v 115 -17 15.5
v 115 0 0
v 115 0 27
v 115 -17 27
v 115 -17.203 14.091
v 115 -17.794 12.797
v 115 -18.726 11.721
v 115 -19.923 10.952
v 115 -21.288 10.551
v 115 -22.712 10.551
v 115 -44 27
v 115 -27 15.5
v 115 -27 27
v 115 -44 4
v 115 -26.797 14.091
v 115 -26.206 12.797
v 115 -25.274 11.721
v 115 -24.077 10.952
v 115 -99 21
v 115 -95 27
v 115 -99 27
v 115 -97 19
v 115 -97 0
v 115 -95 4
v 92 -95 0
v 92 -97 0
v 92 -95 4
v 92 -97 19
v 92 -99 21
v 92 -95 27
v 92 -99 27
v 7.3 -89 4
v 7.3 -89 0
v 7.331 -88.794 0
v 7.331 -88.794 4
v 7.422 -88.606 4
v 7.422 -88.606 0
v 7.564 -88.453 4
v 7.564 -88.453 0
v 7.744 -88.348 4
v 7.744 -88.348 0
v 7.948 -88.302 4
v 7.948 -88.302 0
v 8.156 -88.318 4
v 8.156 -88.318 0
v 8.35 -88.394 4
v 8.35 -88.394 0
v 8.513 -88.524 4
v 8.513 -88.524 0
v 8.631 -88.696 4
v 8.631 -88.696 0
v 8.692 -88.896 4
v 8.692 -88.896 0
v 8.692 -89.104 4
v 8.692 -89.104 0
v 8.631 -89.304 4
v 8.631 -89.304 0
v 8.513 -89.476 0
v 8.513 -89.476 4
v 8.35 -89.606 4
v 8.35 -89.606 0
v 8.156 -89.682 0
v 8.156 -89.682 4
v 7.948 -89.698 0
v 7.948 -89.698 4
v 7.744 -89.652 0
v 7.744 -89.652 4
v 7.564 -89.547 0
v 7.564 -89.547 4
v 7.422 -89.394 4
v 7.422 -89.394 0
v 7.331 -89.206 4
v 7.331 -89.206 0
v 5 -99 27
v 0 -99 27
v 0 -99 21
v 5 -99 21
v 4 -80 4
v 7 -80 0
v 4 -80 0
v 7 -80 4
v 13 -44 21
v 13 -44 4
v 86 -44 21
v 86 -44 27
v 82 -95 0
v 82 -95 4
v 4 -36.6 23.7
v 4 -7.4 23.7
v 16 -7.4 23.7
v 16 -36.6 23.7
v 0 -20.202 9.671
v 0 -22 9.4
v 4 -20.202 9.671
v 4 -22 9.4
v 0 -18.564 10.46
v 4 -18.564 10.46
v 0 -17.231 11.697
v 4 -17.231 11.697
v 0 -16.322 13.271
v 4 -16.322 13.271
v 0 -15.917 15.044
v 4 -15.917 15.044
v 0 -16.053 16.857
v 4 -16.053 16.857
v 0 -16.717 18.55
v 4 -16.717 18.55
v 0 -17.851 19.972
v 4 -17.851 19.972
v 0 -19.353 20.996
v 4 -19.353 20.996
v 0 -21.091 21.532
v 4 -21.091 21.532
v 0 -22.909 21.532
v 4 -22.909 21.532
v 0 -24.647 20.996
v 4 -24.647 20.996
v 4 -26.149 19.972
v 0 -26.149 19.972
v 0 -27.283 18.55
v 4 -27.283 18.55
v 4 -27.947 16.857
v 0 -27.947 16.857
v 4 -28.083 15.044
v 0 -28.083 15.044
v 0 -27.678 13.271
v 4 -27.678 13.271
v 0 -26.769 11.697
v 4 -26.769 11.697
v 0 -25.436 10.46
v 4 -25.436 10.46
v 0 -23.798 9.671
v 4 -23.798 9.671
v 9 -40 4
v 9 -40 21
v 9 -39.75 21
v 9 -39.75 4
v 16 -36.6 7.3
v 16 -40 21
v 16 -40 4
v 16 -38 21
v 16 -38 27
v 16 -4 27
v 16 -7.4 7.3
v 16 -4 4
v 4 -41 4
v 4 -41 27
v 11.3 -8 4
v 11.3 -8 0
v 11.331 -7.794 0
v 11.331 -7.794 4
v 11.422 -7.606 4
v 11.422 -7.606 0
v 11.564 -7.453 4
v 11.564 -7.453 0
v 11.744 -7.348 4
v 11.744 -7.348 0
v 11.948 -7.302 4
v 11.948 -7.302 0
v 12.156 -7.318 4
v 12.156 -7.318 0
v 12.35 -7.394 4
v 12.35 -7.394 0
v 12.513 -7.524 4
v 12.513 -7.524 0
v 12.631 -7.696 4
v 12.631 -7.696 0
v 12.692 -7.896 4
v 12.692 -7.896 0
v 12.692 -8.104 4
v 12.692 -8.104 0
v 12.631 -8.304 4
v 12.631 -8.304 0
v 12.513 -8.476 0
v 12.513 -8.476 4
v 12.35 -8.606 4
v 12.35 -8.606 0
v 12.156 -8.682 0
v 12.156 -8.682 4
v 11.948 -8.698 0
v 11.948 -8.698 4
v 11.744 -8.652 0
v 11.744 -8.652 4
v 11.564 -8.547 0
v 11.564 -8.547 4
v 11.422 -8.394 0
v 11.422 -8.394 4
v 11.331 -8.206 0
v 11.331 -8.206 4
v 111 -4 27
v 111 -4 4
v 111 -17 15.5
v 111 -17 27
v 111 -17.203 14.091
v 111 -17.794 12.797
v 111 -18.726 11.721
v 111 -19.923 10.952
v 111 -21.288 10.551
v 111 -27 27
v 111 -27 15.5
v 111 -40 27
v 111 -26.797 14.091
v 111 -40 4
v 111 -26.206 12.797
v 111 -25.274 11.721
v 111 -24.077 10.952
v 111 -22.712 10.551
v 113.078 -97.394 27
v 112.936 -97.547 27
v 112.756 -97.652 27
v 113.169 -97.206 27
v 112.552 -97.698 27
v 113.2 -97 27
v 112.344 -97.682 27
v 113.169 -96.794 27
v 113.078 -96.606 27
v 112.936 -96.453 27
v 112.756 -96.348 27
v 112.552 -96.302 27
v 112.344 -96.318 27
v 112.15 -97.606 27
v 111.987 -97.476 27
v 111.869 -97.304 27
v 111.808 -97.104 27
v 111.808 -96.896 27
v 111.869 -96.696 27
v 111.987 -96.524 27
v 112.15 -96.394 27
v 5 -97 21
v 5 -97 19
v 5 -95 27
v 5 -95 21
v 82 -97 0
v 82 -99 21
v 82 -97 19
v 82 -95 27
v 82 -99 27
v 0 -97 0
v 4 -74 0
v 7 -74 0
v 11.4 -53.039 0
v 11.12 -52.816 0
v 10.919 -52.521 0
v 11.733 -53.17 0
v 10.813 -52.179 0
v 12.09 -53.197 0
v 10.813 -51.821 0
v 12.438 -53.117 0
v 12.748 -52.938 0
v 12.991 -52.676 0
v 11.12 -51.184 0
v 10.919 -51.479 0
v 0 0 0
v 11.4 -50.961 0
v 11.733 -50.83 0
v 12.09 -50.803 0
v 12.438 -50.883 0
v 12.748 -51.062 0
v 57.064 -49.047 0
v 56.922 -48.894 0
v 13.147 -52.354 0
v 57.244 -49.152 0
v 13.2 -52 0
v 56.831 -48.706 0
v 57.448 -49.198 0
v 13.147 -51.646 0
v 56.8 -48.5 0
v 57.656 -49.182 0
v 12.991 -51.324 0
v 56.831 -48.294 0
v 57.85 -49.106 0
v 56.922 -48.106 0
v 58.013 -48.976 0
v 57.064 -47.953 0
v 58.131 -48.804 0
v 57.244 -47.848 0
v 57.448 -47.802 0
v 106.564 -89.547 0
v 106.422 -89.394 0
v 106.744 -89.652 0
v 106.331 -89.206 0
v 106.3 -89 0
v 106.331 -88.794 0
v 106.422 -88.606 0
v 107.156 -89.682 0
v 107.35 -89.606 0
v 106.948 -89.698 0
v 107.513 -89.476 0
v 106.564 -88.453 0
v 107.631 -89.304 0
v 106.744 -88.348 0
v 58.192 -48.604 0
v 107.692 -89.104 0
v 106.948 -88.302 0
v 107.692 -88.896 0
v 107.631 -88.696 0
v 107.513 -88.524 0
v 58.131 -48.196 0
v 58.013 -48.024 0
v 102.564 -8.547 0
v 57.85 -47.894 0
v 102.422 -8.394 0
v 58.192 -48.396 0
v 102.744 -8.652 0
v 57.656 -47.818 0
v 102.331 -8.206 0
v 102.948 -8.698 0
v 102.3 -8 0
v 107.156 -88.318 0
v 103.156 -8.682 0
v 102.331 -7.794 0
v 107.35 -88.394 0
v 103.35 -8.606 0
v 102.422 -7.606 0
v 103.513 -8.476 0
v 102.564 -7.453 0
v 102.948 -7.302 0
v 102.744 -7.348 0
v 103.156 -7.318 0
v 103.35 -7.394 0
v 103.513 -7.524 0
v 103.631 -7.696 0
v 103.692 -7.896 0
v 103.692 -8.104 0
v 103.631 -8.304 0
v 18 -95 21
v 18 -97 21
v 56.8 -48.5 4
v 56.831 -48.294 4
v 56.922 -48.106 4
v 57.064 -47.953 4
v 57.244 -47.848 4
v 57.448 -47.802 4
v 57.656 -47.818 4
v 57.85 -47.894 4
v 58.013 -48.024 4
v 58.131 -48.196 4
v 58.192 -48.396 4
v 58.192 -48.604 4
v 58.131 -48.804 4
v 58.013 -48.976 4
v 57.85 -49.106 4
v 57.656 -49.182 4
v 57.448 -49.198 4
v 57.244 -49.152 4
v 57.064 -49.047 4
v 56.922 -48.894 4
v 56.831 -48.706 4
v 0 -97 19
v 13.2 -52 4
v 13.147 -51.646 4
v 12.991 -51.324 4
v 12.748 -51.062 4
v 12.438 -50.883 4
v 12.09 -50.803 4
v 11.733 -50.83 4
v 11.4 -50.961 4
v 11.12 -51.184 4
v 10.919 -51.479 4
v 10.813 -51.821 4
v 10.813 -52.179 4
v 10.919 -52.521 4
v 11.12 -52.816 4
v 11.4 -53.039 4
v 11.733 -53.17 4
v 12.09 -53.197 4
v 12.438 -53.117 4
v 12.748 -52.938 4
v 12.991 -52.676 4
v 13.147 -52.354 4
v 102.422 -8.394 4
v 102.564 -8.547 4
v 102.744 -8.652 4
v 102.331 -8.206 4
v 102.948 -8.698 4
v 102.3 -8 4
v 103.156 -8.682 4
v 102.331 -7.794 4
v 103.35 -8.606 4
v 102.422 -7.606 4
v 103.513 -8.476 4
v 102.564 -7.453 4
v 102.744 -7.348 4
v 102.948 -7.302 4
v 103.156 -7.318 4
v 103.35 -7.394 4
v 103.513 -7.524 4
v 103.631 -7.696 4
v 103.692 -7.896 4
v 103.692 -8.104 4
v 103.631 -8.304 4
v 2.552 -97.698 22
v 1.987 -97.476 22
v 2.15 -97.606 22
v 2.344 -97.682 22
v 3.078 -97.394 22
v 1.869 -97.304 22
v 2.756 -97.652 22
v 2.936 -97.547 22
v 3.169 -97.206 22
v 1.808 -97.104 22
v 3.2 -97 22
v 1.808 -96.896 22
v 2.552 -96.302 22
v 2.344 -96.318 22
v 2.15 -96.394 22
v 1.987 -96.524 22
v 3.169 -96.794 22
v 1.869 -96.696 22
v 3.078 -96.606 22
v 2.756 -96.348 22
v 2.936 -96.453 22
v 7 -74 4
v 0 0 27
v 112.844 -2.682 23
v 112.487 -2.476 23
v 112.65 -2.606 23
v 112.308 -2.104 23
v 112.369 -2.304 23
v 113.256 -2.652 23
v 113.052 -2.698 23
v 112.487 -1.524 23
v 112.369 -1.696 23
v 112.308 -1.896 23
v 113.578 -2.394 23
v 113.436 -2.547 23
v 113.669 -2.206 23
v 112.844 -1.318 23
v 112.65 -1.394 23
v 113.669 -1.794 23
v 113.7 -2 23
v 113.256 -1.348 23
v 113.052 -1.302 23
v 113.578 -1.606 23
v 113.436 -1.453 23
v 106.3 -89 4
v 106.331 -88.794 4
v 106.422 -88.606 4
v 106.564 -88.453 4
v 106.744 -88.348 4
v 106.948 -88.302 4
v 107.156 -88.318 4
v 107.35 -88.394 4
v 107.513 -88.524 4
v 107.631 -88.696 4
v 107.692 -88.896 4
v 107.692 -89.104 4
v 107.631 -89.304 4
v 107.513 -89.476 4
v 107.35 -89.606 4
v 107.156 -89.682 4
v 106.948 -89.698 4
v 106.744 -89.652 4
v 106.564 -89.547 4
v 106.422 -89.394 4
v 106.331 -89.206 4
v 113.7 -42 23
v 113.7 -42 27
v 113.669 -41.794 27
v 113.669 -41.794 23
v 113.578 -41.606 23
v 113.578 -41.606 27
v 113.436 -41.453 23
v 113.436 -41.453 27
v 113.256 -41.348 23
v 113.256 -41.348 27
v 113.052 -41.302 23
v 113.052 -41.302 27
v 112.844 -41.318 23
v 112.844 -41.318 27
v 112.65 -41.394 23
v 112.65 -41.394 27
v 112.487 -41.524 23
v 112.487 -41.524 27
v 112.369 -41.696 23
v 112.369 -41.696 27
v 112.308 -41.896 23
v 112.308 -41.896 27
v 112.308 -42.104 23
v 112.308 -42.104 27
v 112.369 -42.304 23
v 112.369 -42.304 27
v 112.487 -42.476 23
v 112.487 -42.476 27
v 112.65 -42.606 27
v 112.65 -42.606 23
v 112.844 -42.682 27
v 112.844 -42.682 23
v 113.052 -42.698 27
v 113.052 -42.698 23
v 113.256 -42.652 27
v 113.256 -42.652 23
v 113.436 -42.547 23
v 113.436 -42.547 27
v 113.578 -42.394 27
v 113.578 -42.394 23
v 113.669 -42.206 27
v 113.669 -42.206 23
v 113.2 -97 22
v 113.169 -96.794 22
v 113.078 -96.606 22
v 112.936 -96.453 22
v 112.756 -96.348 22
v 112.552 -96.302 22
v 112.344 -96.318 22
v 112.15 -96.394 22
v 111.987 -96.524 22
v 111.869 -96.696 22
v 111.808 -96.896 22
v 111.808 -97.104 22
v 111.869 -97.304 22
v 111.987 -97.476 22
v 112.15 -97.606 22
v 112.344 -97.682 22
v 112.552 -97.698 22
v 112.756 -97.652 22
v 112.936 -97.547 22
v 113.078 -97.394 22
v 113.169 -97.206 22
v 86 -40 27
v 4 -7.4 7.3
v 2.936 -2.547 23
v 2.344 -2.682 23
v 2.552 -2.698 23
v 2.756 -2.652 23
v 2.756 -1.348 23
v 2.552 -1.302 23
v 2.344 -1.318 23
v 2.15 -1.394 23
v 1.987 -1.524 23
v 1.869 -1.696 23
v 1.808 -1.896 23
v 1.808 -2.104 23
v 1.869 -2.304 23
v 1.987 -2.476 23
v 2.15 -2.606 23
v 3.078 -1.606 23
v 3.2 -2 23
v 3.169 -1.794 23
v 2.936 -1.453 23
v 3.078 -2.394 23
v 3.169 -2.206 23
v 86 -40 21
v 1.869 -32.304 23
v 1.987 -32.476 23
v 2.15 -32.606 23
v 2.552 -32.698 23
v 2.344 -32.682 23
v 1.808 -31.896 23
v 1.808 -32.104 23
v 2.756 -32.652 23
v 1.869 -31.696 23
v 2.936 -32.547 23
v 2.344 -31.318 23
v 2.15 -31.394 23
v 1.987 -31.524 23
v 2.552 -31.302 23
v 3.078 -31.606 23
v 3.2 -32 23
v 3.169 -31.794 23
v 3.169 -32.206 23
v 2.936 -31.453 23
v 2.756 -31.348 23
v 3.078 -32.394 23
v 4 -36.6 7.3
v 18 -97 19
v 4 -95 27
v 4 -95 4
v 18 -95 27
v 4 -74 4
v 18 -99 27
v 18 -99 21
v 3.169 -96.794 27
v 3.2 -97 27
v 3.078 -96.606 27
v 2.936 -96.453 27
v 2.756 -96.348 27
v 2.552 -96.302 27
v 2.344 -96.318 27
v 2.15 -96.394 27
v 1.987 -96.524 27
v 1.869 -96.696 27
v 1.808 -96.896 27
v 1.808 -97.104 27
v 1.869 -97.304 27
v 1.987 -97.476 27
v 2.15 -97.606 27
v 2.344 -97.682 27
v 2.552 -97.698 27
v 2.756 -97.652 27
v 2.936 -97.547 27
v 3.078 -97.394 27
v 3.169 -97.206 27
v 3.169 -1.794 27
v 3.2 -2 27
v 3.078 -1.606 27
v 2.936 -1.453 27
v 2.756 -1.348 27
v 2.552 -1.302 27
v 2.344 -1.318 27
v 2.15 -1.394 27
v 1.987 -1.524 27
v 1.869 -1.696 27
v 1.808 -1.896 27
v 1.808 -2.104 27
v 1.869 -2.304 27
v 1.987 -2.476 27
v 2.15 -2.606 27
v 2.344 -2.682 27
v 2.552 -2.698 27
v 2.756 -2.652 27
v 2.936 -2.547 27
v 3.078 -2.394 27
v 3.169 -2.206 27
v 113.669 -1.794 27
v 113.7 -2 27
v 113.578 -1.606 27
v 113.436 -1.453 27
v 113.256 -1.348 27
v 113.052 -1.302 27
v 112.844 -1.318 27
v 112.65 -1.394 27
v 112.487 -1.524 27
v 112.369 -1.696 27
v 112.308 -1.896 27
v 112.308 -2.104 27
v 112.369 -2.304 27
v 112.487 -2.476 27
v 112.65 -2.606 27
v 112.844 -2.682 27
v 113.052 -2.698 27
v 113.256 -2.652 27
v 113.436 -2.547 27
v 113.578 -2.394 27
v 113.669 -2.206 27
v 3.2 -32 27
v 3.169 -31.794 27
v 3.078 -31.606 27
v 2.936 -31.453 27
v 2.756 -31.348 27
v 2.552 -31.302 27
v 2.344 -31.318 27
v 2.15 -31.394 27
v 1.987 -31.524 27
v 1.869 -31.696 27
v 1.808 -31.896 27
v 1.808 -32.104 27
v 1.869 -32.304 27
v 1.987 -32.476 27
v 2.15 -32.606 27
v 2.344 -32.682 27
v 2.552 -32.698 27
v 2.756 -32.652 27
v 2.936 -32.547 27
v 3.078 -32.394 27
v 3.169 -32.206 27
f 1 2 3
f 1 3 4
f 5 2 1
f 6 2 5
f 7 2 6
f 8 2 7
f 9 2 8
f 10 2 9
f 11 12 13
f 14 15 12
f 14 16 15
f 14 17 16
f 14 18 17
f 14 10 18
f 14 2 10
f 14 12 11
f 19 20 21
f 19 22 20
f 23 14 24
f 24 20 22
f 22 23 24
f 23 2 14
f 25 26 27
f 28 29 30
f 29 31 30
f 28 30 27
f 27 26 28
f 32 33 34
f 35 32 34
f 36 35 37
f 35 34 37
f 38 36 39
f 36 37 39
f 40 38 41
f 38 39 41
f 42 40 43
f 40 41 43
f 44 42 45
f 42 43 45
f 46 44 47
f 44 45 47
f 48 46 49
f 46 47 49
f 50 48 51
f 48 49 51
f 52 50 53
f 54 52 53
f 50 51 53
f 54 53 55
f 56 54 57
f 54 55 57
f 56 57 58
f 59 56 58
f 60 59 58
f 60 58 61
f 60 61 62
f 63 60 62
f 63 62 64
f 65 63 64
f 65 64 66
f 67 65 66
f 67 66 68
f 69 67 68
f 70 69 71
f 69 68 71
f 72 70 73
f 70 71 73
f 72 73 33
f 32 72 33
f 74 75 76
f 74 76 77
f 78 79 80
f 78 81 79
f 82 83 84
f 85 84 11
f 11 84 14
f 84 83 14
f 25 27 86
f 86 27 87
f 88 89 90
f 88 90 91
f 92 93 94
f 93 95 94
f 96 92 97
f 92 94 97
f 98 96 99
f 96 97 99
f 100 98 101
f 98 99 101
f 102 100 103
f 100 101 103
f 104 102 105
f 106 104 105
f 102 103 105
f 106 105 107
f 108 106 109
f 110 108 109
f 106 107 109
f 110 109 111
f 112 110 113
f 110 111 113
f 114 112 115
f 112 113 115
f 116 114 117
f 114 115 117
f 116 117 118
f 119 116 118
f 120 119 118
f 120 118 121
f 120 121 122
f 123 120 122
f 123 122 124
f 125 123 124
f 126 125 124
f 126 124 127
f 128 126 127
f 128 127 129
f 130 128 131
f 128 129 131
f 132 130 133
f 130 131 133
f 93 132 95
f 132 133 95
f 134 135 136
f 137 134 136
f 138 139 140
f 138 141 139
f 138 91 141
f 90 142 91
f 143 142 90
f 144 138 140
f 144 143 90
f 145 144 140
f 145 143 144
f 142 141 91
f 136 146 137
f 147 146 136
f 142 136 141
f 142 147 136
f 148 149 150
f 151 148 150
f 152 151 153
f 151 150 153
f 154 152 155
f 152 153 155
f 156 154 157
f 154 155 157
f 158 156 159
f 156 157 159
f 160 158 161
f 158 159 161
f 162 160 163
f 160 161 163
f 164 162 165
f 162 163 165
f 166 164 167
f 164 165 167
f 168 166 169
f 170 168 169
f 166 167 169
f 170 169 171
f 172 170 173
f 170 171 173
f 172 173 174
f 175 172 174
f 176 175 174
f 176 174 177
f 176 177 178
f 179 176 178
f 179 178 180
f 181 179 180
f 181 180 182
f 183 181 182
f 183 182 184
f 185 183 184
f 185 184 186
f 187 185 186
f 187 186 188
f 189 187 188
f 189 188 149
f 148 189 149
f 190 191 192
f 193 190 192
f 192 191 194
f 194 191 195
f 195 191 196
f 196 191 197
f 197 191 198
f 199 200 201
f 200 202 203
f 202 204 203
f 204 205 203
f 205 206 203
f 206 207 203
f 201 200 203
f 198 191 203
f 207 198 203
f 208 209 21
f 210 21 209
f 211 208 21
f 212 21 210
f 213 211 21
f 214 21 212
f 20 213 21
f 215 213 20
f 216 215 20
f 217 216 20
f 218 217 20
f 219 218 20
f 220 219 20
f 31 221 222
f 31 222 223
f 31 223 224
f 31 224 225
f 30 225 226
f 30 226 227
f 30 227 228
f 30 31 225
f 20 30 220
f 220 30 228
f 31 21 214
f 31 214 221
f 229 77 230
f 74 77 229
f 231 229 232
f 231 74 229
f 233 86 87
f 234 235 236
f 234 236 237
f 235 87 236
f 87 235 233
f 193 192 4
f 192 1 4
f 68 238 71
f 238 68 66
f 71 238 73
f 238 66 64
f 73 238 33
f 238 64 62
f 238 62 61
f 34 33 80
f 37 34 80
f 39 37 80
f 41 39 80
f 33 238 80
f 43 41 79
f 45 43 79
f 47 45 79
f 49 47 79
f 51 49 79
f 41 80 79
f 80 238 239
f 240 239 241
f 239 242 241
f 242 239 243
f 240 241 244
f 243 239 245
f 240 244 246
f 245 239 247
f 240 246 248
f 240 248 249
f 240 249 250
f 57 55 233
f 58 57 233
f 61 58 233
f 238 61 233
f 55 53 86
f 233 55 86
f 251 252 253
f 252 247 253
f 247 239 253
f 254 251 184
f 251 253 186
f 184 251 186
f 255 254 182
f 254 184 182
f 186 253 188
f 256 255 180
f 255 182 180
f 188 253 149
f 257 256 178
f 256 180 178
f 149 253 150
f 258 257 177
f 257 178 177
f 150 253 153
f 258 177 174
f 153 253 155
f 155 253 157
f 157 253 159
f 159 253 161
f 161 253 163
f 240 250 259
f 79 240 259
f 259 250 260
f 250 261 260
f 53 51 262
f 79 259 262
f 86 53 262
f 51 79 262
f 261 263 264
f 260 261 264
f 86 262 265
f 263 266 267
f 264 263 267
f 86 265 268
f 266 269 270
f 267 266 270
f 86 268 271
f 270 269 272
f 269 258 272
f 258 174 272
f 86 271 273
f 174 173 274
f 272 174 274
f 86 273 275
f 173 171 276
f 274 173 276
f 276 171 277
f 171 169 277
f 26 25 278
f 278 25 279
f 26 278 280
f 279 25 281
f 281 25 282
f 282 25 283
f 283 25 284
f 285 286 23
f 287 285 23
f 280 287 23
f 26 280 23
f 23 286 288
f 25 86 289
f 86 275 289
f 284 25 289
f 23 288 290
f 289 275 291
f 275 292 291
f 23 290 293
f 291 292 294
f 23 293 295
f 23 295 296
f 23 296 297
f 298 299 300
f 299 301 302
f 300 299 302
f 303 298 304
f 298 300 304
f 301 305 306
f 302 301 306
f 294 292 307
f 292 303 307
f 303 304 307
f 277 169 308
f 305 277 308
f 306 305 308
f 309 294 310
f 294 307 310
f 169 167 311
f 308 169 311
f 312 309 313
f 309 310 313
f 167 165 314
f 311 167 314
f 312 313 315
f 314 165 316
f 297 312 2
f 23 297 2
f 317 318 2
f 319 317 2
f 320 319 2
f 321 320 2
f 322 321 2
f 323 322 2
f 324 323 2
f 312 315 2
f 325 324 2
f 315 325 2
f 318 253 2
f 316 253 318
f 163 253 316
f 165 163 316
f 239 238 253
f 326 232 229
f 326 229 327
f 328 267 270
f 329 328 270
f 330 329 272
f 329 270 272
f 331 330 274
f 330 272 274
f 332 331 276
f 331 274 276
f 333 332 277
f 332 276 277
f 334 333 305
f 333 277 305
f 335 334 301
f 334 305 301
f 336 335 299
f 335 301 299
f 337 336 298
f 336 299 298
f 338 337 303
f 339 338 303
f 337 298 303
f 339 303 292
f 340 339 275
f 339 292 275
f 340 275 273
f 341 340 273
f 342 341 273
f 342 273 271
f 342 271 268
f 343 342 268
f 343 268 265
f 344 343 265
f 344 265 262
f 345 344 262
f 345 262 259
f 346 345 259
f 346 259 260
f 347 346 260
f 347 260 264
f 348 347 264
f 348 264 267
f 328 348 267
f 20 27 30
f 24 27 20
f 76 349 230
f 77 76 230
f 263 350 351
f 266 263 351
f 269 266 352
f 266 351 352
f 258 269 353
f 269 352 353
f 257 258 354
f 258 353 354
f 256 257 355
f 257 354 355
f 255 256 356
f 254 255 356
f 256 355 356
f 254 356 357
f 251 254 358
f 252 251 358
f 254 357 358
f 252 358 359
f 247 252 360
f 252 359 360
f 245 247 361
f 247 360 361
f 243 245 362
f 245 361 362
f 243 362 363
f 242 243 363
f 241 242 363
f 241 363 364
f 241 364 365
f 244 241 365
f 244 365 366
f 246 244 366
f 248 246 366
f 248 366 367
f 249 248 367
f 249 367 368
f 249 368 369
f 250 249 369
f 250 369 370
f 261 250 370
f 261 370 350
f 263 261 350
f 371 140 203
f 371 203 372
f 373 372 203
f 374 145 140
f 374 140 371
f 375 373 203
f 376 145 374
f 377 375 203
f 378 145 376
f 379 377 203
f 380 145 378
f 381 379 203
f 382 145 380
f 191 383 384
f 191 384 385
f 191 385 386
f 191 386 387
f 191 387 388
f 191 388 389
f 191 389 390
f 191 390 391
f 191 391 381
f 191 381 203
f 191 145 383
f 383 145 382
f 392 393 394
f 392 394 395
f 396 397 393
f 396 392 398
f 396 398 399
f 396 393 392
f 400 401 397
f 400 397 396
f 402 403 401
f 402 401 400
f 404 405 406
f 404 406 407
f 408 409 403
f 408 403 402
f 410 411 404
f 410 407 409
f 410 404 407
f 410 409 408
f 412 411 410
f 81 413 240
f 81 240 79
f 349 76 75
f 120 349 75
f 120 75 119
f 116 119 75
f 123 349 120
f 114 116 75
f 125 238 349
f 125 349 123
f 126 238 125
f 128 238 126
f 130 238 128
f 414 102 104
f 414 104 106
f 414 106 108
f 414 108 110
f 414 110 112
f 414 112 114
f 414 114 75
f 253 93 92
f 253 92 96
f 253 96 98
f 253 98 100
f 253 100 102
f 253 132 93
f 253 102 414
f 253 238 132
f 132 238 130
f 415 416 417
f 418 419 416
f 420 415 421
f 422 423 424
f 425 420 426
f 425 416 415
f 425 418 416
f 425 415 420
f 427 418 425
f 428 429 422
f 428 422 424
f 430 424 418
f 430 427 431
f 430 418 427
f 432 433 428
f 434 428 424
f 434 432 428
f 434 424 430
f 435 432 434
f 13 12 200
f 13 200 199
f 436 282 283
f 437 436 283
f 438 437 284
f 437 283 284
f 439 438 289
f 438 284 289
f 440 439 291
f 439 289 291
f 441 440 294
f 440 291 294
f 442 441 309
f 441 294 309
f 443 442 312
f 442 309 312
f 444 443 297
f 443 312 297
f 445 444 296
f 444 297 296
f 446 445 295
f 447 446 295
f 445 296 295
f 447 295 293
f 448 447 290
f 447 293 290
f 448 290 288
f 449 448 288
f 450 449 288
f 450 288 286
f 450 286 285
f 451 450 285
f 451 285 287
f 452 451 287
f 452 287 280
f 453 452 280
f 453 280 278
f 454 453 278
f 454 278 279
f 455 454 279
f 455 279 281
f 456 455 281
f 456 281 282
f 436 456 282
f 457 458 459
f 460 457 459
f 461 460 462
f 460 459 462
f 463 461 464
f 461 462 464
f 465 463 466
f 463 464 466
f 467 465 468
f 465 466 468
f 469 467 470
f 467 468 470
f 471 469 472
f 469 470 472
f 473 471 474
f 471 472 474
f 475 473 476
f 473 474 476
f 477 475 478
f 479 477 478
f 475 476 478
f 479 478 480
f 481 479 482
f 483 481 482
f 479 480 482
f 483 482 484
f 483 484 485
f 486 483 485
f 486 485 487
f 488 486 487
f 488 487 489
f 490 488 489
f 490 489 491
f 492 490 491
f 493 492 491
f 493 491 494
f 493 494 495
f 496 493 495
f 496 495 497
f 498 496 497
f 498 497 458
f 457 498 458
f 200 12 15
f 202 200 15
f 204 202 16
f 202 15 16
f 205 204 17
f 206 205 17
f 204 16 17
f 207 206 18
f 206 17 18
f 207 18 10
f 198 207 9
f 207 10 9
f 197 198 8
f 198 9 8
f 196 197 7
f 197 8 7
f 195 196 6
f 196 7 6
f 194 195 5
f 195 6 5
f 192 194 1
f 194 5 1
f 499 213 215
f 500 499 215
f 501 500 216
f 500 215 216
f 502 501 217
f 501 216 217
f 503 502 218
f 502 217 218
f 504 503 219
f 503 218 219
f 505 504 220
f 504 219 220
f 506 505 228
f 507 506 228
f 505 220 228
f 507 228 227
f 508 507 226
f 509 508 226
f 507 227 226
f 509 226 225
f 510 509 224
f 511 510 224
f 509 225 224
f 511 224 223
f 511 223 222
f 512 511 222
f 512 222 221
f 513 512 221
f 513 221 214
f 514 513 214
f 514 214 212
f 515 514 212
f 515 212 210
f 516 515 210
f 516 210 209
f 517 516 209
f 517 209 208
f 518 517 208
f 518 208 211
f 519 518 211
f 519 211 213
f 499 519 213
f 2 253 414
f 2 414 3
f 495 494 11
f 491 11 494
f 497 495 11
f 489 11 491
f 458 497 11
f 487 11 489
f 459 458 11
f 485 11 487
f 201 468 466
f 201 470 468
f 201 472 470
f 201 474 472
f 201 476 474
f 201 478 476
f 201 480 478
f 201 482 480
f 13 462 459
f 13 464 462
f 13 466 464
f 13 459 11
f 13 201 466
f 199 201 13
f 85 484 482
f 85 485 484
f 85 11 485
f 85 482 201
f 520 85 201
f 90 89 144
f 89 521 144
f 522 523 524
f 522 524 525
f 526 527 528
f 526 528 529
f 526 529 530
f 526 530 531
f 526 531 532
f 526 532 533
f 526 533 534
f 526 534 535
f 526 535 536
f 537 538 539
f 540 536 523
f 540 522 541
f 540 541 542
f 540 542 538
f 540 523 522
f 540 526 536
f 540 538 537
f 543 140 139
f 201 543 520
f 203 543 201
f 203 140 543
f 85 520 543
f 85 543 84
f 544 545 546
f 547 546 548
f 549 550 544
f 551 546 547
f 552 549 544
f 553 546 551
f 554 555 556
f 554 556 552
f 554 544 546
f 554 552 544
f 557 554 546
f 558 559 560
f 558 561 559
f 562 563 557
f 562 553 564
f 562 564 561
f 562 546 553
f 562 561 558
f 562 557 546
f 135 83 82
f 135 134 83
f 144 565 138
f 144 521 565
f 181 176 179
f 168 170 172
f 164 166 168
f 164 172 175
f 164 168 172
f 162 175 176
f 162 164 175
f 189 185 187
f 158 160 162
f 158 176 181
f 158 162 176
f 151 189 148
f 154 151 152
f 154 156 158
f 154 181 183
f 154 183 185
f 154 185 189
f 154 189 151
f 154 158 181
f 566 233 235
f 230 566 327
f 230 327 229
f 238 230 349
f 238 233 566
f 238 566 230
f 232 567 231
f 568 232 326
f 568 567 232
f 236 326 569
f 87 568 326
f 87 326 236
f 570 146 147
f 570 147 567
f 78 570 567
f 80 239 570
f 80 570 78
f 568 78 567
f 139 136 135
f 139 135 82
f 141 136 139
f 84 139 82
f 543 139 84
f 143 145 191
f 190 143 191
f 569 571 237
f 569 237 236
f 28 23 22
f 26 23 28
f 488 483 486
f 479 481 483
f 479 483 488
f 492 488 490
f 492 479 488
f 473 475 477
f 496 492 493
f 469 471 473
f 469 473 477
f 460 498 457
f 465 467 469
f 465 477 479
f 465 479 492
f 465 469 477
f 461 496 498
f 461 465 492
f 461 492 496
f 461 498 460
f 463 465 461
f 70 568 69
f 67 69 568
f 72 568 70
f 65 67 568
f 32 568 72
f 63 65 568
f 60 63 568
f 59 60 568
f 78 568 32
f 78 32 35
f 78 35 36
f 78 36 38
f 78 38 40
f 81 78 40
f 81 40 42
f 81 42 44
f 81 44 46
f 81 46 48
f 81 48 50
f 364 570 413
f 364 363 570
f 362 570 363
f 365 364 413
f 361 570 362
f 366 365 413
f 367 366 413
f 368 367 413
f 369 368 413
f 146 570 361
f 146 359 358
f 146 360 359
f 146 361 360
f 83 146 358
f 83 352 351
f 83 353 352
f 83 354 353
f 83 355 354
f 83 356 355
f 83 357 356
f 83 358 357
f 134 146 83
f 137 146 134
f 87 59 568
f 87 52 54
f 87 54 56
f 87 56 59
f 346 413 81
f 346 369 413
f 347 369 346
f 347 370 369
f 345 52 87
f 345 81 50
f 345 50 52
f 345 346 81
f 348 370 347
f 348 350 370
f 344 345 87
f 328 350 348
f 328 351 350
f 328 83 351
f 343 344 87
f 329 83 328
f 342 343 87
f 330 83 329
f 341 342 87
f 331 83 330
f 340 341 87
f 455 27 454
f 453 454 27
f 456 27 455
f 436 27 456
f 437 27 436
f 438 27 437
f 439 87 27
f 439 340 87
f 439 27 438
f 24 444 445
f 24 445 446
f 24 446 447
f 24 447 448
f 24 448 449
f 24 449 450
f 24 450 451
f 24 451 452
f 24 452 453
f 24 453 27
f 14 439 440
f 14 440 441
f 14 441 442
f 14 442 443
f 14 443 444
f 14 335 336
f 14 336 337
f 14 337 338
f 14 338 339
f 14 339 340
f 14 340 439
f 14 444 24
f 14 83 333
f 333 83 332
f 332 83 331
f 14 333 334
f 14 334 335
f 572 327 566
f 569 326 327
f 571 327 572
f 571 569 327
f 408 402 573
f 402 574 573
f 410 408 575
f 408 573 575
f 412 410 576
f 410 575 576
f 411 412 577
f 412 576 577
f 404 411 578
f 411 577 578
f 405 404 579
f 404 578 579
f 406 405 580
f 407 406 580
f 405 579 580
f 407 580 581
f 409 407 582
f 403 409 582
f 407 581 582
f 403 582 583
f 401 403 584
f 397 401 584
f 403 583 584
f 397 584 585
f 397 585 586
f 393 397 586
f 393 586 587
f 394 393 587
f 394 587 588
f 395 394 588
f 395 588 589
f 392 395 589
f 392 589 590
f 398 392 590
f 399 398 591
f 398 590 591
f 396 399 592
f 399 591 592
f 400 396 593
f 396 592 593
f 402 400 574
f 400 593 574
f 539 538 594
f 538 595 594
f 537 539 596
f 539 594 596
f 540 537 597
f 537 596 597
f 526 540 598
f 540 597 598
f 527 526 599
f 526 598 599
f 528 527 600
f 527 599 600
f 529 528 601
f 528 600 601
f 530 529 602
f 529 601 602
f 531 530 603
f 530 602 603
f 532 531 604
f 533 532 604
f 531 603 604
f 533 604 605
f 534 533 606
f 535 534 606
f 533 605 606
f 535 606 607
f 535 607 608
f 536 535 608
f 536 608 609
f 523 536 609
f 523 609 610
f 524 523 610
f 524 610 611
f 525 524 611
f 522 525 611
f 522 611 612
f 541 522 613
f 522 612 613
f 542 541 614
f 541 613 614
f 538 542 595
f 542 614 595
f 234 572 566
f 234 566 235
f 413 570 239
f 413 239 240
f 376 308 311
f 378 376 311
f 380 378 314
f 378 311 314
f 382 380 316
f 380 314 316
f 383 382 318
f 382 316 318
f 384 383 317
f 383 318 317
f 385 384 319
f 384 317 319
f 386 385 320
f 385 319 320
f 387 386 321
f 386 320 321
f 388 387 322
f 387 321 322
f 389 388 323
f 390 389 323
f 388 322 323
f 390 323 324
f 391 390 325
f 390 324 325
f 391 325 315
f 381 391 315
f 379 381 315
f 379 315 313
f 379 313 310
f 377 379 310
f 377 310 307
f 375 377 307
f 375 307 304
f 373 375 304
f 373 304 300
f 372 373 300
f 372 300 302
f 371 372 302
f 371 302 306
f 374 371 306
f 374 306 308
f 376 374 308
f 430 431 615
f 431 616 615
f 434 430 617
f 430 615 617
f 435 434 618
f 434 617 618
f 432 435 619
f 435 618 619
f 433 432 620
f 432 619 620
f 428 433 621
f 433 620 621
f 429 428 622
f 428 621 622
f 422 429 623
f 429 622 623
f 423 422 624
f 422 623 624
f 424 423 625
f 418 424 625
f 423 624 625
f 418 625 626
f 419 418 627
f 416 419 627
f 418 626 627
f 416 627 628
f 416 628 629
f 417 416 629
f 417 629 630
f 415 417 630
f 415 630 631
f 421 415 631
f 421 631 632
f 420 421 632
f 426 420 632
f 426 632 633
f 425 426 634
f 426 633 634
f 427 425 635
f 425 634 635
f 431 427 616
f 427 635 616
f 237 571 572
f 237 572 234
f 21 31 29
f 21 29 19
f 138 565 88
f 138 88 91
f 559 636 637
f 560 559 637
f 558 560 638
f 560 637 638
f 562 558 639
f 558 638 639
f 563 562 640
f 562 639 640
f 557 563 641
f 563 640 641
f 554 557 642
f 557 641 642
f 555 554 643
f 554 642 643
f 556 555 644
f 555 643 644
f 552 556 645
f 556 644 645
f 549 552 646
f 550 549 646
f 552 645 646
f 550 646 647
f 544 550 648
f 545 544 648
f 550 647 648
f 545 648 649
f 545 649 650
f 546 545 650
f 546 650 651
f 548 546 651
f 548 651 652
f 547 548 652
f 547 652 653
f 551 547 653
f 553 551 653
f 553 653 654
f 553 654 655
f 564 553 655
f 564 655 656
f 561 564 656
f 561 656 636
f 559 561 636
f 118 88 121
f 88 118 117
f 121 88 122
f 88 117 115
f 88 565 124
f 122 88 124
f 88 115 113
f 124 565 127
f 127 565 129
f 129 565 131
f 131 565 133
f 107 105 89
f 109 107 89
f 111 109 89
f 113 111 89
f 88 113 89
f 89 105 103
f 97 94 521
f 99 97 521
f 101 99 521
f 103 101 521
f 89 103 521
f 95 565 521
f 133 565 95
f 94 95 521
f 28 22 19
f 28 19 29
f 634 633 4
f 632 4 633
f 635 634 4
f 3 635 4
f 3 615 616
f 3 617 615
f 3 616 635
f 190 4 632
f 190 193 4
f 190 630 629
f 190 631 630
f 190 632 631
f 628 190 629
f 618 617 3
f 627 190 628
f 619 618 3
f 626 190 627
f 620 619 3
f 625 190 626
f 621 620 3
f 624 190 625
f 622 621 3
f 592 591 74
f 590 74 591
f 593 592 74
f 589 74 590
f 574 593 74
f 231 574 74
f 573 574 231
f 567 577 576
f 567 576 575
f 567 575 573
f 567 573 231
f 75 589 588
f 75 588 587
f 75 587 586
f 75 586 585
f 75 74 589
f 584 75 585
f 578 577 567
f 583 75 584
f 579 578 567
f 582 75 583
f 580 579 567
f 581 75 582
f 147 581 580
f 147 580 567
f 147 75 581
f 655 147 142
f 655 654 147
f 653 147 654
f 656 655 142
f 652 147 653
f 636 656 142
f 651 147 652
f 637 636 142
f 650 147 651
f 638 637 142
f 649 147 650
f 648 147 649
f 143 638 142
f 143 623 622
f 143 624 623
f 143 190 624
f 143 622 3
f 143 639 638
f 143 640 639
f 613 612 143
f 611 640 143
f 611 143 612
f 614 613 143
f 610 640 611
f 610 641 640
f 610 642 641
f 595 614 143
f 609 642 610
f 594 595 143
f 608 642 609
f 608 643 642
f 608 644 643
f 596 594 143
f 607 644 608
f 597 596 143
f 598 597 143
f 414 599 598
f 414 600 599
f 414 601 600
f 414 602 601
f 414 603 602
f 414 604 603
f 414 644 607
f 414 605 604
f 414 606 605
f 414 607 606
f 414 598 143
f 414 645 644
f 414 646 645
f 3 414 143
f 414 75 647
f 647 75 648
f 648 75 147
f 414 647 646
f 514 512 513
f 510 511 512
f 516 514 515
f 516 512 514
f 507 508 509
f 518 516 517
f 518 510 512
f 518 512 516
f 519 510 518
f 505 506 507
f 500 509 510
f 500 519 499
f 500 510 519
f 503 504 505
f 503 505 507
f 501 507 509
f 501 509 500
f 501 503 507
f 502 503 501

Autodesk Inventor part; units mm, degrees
ref_plane "YZ Plane" through (0, 0, 0) normal (1, 0, 0) x (0, 1, 0)
ref_plane "XZ Plane" through (0, 0, 0) normal (0, 1, 0) x (-1, 0, 0)
ref_plane "XY Plane" through (0, 0, 0) normal (0, 0, 1) x (1, 0, 0)
sketch "Skizze1" plane through (0, 0, 0) normal (0, 0, 1) x (1, 0, 0)
  line L0 (0, 0) -> (115, 0)
  line L1 (115, 0) -> (115, -97)
  line L2 (115, -97) -> (0, -97)
  line L3 (0, -97) -> (0, 0)
  dimension "d0" = 115
  dimension "d1" = 97
extrude "Extrusion1" add sketch "Skizze1" along normal blind 4
sketch "Skizze2" plane through (0, 0, 4) normal (0, 0, 1) x (1, 0, 0)
  line L0 (0, -97) -> (115, -97) projected
  line L1 (115, -97) -> (115, 0) projected
  line L2 (115, 0) -> (0, 0) projected
  line L3 (0, 0) -> (0, -97) projected
  line L4 (4, -44) -> (4, -95)
  line L5 (4, -95) -> (115, -95)
  line L6 (115, -97) -> (115, 0) projected
  line L7 (4, -44) -> (115, -44)
  line L8 (4, -40) -> (16, -40) construction
  line L9 (4, -40) -> (4, -36.6) construction
  line L10 (4, -4) -> (16, -4) construction
  line L11 (4, -7.4) -> (16, -7.4)
  line L12 (16, -7.4) -> (16, -4)
  line L13 (4, -36.6) -> (16, -36.6)
  line L14 (16, -36.6) -> (16, -40)
  line L15 (4, -36.6) -> (4, -7.4)
  line L16 (16, -40) -> (111, -40)
  line L17 (4, -7.4) -> (4, -4) construction
  line L18 (16, -4) -> (111, -4)
  line L19 (111, -4) -> (111, -40)
  point P0 (109.25, 0)
  point P1 (109.25, -40)
  dimension "d4" = 4
  dimension "d5" = 2
  dimension "d6" = 51
  dimension "d7" = 4
  dimension "d8" = 36
  dimension "d9" = 4
  dimension "d10" = 29.2
  dimension "d11" = 12
  dimension "d30" = 4
extrude "Extrusion2" add sketch "Skizze2" along normal blind 23 contours L3 L2 L1 L7 L4 L5 L0
sketch "Skizze4" plane through (0, 0, 4) normal (0, 0, 1) x (1, 0, 0)
  line L0 (4, -36.6) -> (16, -36.6) projected
  line L1 (4, -36.6) -> (16, -36.6)
  line L2 (16, -36.6) -> (16, -7.4)
  line L3 (16, -7.4) -> (4, -7.4)
  line L4 (4, -7.4) -> (4, -36.6)
  point P0 (0, 0)
  point P1 (16, -7.4)
extrude "Extrusion4" add sketch "Skizze4" along normal blind 3.3
sketch "Skizze5" plane through (4, -36.6, 27) normal (1, 0, 0) x (0, 0, -1)
  line L0 (0, 0) -> (0, 29.2) projected
  line L1 (0, 29.2) -> (3.3, 29.2)
  line L2 (3.3, 29.2) -> (3.3, 0)
  line L3 (3.3, 0) -> (0, 0)
  line L4 (0, 0) -> (0, 29.2)
  line L5 (19.7, 0) -> (0, 0) projected
  line L6 (19.7, 0) -> (19.7, 29.2) projected
  circle A0 centre (11.5, 14.6) radius 6.1
  line L7 (7.2229, 14.6) -> (16.7001, 14.6)
  line L8 (11.5, 24.1317) -> (11.5, 8.2548) construction
  point P0 (27, 36.6)
  dimension "d20" = 16.4
  dimension "d21" = 29.2
  dimension "d22" = 12.2
extrude "Extrusion5" cut sketch "Skizze5" against normal through all contours A0
extrude "Extrusion6" add sketch "Skizze5" along normal up to surface (12 mm away) contours L0 L1 L2 L3
sketch "Skizze6" plane through (0, 0, 27) normal (0, 0, 1) x (1, 0, 0)
  line L0 (4, -44) -> (115, -44) projected
  line L1 (111, -40) -> (16, -40) projected
  line L2 (86, -44) -> (16, -44)
  line L3 (16, -44) -> (16, -40)
  line L4 (16, -40) -> (86, -40)
  line L5 (86, -40) -> (86, -44)
  line L6 (4, -44) -> (4, -95) projected
  line L7 (0, -97) -> (115, -97) projected
  line L8 (14, -97) -> (7, -97)
  line L9 (115, -95) -> (4, -95) projected
  line L10 (92, -95) -> (82, -95)
  line L11 (82, -95) -> (82, -97)
  line L12 (82, -97) -> (92, -97)
  line L13 (92, -97) -> (92, -95)
  line L14 (115, -97) -> (115, -95) projected
  line L15 (5, -95) -> (18, -95)
  line L16 (18, -95) -> (18, -97)
  line L17 (18, -97) -> (5, -97)
  line L18 (5, -97) -> (5, -95)
  line L19 (0, 0) -> (0, -97) projected
  point P0 (109.25, -40)
  point P1 (86, -42)
  point P2 (86, -40)
  point P3 (82, -95)
  point P4 (5, -96)
  point P5 (18, -96)
  point P6 (5, -97)
  point P7 (18, -97)
  dimension "d27" = 70
  dimension "d41" = 10
  dimension "d42" = 23
  dimension "d65" = 13
  dimension "d66" = 5
extrude "Extrusion7" cut sketch "Skizze6" against normal blind 6 contours L3 L1 L5 L0
sketch "Skizze7" plane through (115, -97, 0) normal (1, 0, 0) x (0, 0, -1)
  arc A0 (-15.5, 80) -> (-15.5, 70) centre (-15.5, 75) ccw construction
  circle A1 centre (-15.5, 75) radius 6.1 construction
  line L0 (-15.5, 80) -> (-27, 80)
  line L1 (-27, 53) -> (-27, 97) projected
  line L2 (-15.5, 70) -> (-27, 70)
  arc A2 (-15.5, 70) -> (-15.5, 80) centre (-15.5, 75) ccw
  point P0 (0, 97)
  dimension "d31" = 10
extrude "Extrusion8" cut sketch "Skizze7" against normal blind 4
sketch "Skizze8" plane through (0, 0, 0) normal (0, 0, -1) x (-1, 0, 0)
  line L0 (0, -97) -> (-115, -97) projected
  line L1 (0, 0) -> (0, -97) projected
  line L2 (-115, 0) -> (0, 0) projected
  line L3 (-115, -97) -> (-115, 0) projected
  line L4 (-8, -8) -> (-8, -89) construction
  line L5 (-8, -89) -> (-107, -89) construction
  line L6 (-107, -89) -> (-107, -8) construction
  line L7 (-107, -8) -> (-8, -8) construction
  circle A0 centre (-107, -89) radius 0.7
  circle A1 centre (-8, -89) radius 0.7
  circle A2 centre (-103, -8) radius 0.7
  circle A3 centre (-12, -8) radius 0.7
  line L8 (-107, -8) -> (-8, -89) construction
  line L9 (-107, -89) -> (-8, -8) construction
  circle A4 centre (-57.5, -48.5) radius 0.7
  dimension "d34" = 8
  dimension "d35" = 1.4
  dimension "d36" = 4
  dimension "d37" = 4
extrude "Extrusion9" cut sketch "Skizze8" against normal blind 4 contours A0 | A1 | A2 | A3 | A4
extrude "Extrusion10" cut sketch "Skizze6" against normal blind 6 contours L9 L16 L7 L18
sketch "Skizze9" plane through (0, 0, 27) normal (0, 0, 1) x (1, 0, 0)
  line L0 (4, -95) -> (4, -44) projected
  line L1 (4, -44) -> (16, -44) projected
  line L2 (16, -44) -> (16, -4) projected
  line L3 (16, -4) -> (111, -4) projected
  line L4 (111, -4) -> (111, -17) projected
  line L5 (111, -40) -> (86, -40) projected
  line L6 (86, -40) -> (86, -44) projected
  line L7 (86, -44) -> (115, -44) projected
  line L8 (115, -44) -> (115, -27) projected
  line L9 (115, 0) -> (0, 0) projected
  line L10 (0, 0) -> (0, -97) projected
  line L11 (0, -97) -> (5, -97) projected
  line L12 (2.5, -2) -> (113, -2) construction
  line L13 (113, -2) -> (113, -97.1903) construction
  line L14 (113, -97.1903) -> (2.5, -97.1903) construction
  line L15 (2.5, -97.1903) -> (2.5, -2) construction
  circle A0 centre (2.5, -2) radius 0.7
  circle A1 centre (113, -2) radius 0.7
  circle A2 centre (113, -42) radius 0.7
  line L16 (113, -42) -> (2.5, -42) construction
  line L17 (4, -44) -> (16, -44) construction
  circle A3 centre (2.5, -32) radius 0.7
  line L18 (115, -27) -> (111, -27) projected
  line L19 (111, -27) -> (111, -40) projected
  line L20 (111, -17) -> (115, -17) projected
  line L21 (115, -17) -> (115, 0) projected
  line L22 (115, -97) -> (115, -95) projected
  line L23 (115, -95) -> (18, -95) projected
  line L24 (5, -97) -> (5, -95) projected
  line L25 (5, -95) -> (4, -95) projected
  line L26 (18, -95) -> (18, -97) projected
  line L27 (18, -97) -> (115, -97) projected
  dimension "d45" = 2
  dimension "d46" = 2.5
  dimension "d47" = 2
  dimension "d48" = 1.4
  dimension "d49" = 2
  dimension "d59" = 30
extrude "Extrusion11" cut sketch "Skizze9" against normal blind 4 contours A0 | A1 | A2 | A3
extrude "Extrusion12" cut sketch "Skizze6" against normal through all contours L9 L13 L7 L11
sketch "Skizze12" plane through (0, -97, 0) normal (0, -1, 0) x (1, 0, 0)
  line L0 (115, 4) -> (115, 27) projected
  line L1 (115, 27) -> (92, 27)
  line L2 (92, 27) -> (92, 21)
  line L3 (92, 21) -> (115, 21)
  line L4 (115, 21) -> (115, 27)
  line L5 (82, 0) -> (82, 27) projected
  line L6 (18, 27) -> (18, 21) projected
  line L7 (82, 27) -> (18, 27)
  line L8 (18, 27) -> (18, 21)
  line L9 (18, 21) -> (82, 21)
  line L10 (82, 21) -> (82, 27)
  line L11 (5, 21) -> (5, 27) projected
  line L12 (0, 0) -> (0, 27) projected
  line L13 (5, 21) -> (0, 21)
  line L14 (0, 21) -> (0, 27)
  line L15 (0, 27) -> (5, 27)
  line L16 (5, 27) -> (5, 21)
  point P0 (5, 27)
  point P1 (0, 21)
  dimension "d67" = 6
extrude "Extrusion15" add sketch "Skizze12" along normal blind 2
sketch "Skizze10" plane through (0, 0, 27) normal (0, 0, 1) x (1, 0, 0)
  line L0 (16, -44) -> (16, -4) projected
  line L1 (4, -44) -> (16, -44) projected
  line L2 (4, -95) -> (4, -44) projected
  line L3 (4, -44) -> (4, -41)
  line L4 (4, -41) -> (16, -38)
  point P0 (0, 0)
  dimension "d56" = 6
  dimension "d77" = 3
extrude "Extrusion13" cut sketch "Skizze10" against normal blind 6
sketch "Skizze11" plane through (0, 0, 4) normal (0, 0, 1) x (1, 0, 0)
  circle A0 centre (12, -52) radius 1.2
  line L0 (4, -44) -> (4, -95) projected
  line L1 (115, -44) -> (4, -44) projected
  point P0 (0, 0)
  dimension "d60" = 8
  dimension "d61" = 8
  dimension "d62" = 2.4
extrude "Extrusion14" cut sketch "Skizze11" against normal blind 4
sketch "Skizze13" plane through (0, 0, 27) normal (0, 0, 1) x (1, 0, 0)
  line L0 (5, -97) -> (0, -97) projected
  circle A0 centre (2.5, -97) radius 0.7
  circle A1 centre (2.5, -32) radius 0.7 projected
  line L1 (0, 0) -> (0, -99) projected
  line L2 (115, -97) -> (92, -97) projected
  circle A2 centre (112.5, -97) radius 0.7
  line L3 (115, -95) -> (115, -99) projected
  dimension "d70" = 2.5
  dimension "d71" = 2.5
extrude "Extrusion16" cut sketch "Skizze13" against normal blind 5 contours A0 L0 | L0 A0 | A2 L2 | L2 A2
chamfer "Fasen1" distance 2 angle 45 3 edges at (2.5, -97, 21) (50, -97, 21) (103.5, -97, 21)
sketch "Skizze14" plane through (0, 0, 4) normal (0, 0, 1) x (1, 0, 0)
  line L0 (115, -44) -> (4, -44) projected
  line L1 (4, -74) -> (7, -74)
  line L2 (7, -74) -> (7, -80)
  line L3 (7, -80) -> (4, -80)
  line L4 (4, -80) -> (4, -44)
  line L5 (4, -95) -> (82, -95) projected
  point P0 (0, 0)
  point P1 (7, -44)
  point P2 (4, -74)
  dimension "d78" = 6
  dimension "d79" = 3
  dimension "d82" = 15
extrude "Extrusion17" cut sketch "Skizze14" against normal blind 10
sketch "Skizze16" plane through (0, 0, 21) normal (0, 0, 1) x (1, 0, 0)
  line L0 (86, -44) -> (4, -44) projected
  line L1 (4, -44) -> (4, -41) projected
  line L2 (4, -44) -> (4, -41)
  line L3 (4, -41) -> (9, -39.75)
  line L4 (4, -41) -> (16, -38) projected
  line L5 (9, -44.0784) -> (9, -39.75)
  point P0 (0, 0)
  point P1 (9, -41.9142)
  point P2 (9, -44)
  dimension "d83" = 5
extrude "Extrusion18" cut sketch "Skizze16" against normal up to surface (17 mm away)
chamfer "Fasen2" distance 4 angle 45 1 edges at (9, -44, 12.5)
properties part number "Honigschleuder_Steuerung_Netzteil"
